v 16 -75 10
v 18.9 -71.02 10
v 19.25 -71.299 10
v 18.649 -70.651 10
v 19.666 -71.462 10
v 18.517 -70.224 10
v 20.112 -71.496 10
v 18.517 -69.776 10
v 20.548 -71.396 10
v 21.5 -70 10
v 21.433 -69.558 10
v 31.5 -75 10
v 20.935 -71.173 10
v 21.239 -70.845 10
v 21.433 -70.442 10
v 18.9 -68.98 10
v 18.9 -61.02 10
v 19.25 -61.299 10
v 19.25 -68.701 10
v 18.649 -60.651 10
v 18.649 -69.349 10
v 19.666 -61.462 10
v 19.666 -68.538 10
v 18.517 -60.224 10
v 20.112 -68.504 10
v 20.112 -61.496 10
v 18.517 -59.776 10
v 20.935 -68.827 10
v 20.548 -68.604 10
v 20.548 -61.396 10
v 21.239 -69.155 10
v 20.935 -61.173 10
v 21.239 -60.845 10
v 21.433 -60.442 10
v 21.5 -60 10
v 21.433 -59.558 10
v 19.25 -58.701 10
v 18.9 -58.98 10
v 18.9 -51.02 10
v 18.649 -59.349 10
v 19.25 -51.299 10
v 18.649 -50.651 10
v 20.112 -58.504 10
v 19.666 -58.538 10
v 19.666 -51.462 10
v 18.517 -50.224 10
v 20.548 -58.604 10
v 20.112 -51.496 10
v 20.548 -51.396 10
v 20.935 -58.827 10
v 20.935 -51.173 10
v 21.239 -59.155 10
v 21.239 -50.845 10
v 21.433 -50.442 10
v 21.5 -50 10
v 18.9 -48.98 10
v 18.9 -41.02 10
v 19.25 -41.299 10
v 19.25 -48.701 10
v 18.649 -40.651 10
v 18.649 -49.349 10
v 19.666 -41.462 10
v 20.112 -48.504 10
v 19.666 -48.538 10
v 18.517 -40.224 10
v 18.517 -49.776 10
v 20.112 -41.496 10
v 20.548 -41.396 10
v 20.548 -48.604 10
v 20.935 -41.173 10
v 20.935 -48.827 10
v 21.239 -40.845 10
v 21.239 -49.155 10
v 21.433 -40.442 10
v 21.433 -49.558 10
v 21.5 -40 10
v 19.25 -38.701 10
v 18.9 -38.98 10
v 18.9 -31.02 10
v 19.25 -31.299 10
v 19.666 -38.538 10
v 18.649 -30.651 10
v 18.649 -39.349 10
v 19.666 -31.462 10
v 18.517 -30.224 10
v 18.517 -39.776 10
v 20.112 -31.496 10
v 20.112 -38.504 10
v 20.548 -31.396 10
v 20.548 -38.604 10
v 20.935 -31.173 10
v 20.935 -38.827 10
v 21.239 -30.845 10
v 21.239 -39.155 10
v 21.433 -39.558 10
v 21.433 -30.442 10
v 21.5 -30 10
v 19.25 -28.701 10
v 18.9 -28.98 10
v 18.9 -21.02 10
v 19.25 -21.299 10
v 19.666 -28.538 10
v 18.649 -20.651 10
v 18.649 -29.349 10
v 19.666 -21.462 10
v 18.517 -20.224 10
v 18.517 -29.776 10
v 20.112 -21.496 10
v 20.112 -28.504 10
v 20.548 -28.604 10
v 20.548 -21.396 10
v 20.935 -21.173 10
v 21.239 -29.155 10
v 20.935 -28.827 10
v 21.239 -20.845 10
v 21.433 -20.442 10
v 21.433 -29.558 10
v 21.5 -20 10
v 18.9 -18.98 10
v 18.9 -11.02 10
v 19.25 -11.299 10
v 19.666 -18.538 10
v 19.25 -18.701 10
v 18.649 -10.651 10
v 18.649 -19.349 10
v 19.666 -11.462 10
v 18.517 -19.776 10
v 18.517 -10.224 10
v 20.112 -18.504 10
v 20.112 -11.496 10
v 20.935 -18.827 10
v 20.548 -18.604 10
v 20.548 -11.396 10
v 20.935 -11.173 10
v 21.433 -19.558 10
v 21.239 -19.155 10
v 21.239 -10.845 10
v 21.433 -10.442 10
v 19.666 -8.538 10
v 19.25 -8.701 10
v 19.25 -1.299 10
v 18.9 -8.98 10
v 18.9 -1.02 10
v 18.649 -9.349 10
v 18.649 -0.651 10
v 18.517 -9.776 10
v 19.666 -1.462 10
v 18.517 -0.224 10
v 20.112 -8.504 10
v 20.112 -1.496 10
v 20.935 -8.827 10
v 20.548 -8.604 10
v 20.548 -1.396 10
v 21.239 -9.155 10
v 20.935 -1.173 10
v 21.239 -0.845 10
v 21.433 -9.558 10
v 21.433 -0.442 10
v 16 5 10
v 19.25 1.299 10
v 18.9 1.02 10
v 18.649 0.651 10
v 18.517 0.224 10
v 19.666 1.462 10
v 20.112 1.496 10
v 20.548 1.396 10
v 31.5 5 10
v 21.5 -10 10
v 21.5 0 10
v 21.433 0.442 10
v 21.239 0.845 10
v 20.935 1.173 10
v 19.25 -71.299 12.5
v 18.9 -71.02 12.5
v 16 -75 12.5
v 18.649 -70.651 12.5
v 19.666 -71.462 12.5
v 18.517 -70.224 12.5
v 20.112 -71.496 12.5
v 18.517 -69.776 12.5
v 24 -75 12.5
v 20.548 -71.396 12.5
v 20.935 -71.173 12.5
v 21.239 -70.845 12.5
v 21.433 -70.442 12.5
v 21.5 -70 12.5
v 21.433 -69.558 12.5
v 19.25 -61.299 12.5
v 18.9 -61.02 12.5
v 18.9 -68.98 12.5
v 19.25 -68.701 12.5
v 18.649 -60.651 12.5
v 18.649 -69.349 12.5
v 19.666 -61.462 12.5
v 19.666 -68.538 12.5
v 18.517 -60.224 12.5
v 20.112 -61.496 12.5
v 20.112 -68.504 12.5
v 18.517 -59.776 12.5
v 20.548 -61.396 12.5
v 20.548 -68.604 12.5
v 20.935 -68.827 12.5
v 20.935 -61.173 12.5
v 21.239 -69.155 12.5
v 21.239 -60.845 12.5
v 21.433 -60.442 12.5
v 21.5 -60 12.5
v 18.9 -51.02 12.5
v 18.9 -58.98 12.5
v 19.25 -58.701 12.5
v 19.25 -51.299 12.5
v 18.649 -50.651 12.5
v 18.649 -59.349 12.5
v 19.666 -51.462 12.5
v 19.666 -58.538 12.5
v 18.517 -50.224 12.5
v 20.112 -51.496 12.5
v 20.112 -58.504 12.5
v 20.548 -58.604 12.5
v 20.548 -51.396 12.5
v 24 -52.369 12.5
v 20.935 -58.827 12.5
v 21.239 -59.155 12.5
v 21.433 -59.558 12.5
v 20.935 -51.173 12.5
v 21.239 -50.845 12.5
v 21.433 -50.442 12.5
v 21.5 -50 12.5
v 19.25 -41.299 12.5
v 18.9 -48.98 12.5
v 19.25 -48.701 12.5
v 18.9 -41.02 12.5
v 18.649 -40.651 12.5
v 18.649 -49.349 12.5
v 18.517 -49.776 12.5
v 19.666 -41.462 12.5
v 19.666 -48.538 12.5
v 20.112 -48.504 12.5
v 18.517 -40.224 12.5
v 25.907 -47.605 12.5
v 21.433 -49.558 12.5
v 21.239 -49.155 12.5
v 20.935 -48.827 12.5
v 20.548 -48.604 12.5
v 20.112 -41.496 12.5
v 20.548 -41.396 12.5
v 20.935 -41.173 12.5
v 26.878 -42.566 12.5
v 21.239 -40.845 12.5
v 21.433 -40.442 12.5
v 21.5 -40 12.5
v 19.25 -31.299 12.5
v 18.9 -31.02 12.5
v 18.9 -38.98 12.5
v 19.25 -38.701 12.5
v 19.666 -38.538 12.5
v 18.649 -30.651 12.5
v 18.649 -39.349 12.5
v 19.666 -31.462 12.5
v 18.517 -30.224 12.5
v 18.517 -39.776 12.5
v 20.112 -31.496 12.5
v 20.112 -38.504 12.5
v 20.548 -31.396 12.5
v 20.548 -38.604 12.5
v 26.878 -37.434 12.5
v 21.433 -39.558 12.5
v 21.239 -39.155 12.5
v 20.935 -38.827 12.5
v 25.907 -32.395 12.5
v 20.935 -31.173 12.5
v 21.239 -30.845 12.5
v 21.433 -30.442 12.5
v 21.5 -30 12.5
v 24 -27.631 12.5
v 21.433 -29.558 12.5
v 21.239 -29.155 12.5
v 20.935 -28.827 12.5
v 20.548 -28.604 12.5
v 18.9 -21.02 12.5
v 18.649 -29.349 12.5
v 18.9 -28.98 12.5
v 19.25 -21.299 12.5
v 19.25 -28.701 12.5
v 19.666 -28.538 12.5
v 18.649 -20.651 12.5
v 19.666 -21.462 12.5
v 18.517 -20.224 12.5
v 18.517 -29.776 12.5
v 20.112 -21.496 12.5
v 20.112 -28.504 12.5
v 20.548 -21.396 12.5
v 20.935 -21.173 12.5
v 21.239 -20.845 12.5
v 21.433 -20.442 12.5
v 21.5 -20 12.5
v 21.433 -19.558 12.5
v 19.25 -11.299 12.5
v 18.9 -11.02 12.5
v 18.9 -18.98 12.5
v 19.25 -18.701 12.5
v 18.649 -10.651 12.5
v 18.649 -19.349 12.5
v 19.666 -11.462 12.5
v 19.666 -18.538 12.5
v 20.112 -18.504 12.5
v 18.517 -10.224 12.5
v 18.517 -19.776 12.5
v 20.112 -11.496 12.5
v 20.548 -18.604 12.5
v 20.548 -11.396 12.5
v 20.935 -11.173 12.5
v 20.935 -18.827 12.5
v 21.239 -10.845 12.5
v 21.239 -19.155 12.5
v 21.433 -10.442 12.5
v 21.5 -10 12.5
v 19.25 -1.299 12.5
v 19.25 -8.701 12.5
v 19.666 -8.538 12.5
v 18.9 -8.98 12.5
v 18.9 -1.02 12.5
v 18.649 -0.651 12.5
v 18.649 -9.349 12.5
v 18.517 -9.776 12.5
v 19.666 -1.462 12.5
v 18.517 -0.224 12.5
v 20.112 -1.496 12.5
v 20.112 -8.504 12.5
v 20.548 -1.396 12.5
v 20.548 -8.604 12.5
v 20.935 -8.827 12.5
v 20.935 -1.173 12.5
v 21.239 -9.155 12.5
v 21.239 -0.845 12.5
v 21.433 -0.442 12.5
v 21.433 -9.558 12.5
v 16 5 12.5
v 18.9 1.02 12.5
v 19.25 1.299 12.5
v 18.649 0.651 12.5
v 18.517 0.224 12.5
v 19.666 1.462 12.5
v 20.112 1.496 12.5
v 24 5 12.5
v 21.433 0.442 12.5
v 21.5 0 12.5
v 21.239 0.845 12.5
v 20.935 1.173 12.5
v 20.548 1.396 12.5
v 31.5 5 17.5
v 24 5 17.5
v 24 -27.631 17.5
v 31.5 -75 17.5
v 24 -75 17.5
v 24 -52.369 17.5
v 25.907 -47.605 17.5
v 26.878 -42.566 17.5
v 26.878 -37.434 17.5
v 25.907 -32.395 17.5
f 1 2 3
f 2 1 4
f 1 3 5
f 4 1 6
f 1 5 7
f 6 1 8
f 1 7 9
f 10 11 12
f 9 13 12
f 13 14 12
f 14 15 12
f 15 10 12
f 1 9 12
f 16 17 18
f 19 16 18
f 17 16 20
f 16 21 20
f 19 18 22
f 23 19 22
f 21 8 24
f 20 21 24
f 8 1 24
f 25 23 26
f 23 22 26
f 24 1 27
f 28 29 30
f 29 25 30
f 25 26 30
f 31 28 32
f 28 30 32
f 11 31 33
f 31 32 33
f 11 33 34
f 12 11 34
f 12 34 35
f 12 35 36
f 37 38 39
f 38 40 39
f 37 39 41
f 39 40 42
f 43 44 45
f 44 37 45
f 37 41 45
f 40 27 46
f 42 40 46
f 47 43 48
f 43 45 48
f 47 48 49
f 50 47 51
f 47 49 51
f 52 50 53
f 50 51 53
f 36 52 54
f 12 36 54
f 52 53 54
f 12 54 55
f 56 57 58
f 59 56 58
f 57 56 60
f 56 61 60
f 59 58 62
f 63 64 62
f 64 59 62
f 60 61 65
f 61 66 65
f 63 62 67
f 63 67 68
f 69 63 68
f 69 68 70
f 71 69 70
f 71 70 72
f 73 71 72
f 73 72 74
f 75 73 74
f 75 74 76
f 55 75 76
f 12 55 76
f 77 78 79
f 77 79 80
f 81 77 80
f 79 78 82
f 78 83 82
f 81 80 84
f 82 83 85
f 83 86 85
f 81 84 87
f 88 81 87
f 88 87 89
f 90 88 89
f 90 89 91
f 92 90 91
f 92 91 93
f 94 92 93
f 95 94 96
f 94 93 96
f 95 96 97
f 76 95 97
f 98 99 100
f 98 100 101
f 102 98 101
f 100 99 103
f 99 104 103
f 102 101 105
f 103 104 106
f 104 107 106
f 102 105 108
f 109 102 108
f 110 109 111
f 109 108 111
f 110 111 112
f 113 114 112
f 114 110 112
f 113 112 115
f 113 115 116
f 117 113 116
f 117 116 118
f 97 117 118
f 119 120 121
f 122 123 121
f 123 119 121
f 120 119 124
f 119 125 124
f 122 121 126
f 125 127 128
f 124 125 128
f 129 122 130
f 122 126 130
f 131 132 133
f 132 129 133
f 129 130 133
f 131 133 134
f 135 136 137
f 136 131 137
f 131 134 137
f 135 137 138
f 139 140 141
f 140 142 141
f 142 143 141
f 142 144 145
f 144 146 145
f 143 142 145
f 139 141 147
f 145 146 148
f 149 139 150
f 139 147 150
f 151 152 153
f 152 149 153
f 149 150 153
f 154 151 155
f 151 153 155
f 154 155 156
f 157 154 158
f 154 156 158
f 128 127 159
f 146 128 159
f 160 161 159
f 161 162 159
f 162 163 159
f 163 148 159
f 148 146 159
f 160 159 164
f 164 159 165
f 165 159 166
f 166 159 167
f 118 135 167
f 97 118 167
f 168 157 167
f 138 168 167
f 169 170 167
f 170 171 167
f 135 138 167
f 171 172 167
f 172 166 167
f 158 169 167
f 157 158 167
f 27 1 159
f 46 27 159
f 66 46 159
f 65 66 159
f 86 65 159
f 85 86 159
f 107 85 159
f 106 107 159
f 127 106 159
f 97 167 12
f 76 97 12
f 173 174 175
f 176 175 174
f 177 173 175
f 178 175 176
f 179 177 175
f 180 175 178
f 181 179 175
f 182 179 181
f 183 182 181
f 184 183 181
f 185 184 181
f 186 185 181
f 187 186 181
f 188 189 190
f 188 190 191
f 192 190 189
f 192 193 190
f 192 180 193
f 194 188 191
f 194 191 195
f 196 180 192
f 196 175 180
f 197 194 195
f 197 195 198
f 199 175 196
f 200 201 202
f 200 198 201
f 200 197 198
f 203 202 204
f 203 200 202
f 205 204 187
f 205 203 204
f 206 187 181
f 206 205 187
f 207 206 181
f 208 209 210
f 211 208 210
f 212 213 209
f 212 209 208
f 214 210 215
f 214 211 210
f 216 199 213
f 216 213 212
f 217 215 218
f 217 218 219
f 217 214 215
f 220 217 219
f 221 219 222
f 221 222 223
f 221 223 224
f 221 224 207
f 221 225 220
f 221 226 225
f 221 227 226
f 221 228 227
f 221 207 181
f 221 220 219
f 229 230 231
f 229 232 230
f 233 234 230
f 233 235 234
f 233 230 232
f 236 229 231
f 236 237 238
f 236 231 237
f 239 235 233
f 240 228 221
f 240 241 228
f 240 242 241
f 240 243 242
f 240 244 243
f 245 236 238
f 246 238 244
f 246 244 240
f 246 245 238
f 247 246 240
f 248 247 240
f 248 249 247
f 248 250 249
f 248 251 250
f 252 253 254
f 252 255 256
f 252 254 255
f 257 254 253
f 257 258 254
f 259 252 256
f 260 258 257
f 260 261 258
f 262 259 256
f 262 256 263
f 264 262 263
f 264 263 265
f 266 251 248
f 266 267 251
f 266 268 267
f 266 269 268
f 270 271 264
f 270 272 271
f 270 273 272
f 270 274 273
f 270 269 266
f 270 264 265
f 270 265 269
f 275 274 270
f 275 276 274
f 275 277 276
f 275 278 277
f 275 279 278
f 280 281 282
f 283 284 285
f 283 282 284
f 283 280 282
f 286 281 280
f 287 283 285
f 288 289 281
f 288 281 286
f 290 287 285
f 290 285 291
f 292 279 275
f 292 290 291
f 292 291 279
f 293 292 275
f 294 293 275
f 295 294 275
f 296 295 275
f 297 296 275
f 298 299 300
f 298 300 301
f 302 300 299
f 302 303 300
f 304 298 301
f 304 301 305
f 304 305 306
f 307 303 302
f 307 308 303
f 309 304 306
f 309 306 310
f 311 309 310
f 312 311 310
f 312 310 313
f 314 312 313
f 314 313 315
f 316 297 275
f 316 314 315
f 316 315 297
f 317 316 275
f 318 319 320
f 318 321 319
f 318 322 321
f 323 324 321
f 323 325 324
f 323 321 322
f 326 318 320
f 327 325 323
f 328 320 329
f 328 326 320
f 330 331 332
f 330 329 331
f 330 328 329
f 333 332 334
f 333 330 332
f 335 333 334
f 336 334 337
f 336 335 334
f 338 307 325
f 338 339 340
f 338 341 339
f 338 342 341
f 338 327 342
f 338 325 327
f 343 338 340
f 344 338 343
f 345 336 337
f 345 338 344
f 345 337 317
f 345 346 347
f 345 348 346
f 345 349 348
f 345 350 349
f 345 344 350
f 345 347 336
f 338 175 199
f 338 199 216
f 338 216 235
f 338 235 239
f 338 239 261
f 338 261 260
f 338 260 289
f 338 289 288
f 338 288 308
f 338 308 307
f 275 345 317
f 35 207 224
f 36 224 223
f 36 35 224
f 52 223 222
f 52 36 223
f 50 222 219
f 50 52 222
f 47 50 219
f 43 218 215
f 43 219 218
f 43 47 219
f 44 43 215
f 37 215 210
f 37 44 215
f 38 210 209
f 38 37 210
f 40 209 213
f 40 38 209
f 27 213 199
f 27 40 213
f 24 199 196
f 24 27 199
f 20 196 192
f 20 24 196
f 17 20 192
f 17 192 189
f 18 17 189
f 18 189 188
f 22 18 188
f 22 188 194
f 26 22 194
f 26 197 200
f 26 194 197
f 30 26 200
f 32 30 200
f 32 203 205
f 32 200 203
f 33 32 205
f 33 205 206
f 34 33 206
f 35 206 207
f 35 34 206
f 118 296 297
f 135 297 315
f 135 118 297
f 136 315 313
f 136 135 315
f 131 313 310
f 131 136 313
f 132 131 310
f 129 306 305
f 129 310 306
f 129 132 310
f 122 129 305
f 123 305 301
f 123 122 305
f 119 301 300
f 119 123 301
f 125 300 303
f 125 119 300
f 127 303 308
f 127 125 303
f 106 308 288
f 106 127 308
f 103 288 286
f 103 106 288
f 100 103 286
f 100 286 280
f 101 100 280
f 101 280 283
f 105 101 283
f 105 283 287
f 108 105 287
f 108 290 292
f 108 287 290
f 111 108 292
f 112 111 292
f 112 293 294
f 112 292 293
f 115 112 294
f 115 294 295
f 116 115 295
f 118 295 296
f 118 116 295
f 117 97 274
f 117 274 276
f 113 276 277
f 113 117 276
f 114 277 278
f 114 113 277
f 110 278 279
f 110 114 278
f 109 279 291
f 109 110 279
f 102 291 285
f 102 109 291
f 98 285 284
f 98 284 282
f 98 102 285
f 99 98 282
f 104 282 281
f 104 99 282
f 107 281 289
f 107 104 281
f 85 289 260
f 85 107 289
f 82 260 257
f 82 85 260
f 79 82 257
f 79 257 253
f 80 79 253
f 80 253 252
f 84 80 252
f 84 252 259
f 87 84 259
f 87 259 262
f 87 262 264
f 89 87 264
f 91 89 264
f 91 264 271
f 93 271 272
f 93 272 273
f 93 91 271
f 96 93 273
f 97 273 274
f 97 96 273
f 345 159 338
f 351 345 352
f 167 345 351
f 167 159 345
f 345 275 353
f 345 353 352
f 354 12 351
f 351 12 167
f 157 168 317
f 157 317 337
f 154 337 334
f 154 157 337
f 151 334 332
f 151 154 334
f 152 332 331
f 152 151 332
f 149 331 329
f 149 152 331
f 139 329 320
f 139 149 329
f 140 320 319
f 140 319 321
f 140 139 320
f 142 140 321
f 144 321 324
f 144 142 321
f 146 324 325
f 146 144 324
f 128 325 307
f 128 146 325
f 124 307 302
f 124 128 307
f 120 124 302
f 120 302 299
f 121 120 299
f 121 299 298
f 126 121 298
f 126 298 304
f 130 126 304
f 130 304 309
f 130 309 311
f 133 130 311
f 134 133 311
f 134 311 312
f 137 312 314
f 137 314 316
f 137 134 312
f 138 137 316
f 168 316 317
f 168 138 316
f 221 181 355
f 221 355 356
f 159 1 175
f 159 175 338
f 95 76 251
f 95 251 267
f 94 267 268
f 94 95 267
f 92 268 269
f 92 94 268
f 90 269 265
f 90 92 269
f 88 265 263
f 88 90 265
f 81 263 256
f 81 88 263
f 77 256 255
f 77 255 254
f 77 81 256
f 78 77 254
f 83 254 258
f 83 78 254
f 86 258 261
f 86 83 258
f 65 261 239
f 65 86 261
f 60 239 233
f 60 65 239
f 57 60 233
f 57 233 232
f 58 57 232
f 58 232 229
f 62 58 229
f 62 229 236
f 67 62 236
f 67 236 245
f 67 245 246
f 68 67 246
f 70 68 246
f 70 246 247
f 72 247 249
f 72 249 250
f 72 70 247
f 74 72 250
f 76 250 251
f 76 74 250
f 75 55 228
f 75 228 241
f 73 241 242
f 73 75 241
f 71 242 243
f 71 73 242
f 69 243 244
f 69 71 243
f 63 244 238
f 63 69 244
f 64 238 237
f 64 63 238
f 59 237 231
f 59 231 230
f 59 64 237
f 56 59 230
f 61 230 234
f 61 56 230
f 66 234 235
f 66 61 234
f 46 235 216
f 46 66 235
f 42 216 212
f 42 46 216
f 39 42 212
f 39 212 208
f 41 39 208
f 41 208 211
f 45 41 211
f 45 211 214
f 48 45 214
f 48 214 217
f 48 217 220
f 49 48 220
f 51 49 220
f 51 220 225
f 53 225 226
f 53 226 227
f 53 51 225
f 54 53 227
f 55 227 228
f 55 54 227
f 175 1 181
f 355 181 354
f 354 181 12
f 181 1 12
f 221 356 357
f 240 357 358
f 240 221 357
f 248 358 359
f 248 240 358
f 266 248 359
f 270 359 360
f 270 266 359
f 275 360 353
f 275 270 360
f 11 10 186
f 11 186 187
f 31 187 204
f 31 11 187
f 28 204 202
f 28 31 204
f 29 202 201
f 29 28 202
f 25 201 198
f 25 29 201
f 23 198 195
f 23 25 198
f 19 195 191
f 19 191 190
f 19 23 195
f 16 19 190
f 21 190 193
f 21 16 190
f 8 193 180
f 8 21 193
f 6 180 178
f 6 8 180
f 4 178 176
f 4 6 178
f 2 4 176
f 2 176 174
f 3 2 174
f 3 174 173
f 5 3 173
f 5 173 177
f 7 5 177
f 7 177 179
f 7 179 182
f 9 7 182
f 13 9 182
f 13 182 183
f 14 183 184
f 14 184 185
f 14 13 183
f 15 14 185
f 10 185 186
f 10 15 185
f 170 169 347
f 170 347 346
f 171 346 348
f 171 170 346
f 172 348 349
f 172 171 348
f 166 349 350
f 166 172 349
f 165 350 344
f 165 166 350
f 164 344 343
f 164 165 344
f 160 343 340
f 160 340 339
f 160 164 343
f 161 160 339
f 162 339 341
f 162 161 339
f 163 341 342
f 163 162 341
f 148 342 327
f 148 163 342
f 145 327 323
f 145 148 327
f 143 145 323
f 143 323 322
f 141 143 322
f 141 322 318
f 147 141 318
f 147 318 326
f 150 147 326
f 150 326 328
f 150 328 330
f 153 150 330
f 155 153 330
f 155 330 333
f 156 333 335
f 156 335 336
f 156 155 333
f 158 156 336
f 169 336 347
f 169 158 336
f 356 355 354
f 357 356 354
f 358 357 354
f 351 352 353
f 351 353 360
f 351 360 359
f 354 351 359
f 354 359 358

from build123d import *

# Parameters (mm, degrees)
SKETCH013_R  = 27
PAD008_DEPTH = 10
SKETCH011_W  = 8
SKETCH011_H  = 80
SKETCH011_R  = 1.5
PAD007_DEPTH = 2.5
SKETCH010_W  = 7.5
SKETCH010_H  = 80
PAD006_DEPTH = 7.5


with BuildPart() as pad008:
    # Sketch013 → Pad008 (new body)
    with BuildSketch(Plane(origin=(0, -40, 12.5), x_dir=(1, 0, 0), z_dir=(0, 0, 1))):
        Circle(SKETCH013_R)
    extrude(amount=PAD008_DEPTH)


with BuildPart() as pad007:
    # Sketch011 → Pad007 (new body)
    with BuildSketch(Plane.XY.offset(10)):
        with Locations((-4, -40)):
            Rectangle(SKETCH011_W, SKETCH011_H)
        with Locations((-4, -45)):
            Circle(SKETCH011_R, mode=Mode.SUBTRACT)
        with Locations((-4, -65)):
            Circle(SKETCH011_R, mode=Mode.SUBTRACT)
        with Locations((-4, -55)):
            Circle(SKETCH011_R, mode=Mode.SUBTRACT)
        with Locations((-4, -75)):
            Circle(SKETCH011_R, mode=Mode.SUBTRACT)
        with Locations((-4, -35)):
            Circle(SKETCH011_R, mode=Mode.SUBTRACT)
        with Locations((-4, -25)):
            Circle(SKETCH011_R, mode=Mode.SUBTRACT)
        with Locations((-4, -15)):
            Circle(SKETCH011_R, mode=Mode.SUBTRACT)
        with Locations((-4, -5)):
            Circle(SKETCH011_R, mode=Mode.SUBTRACT)
    extrude(amount=PAD007_DEPTH)


with BuildPart() as cut002:
    # Sketch010 → Pad006 (new body)
    with BuildSketch(Plane.XY.offset(10)):
        with Locations((3.75, -40)):
            Rectangle(SKETCH010_W, SKETCH010_H)
    extrude(amount=PAD006_DEPTH)

    # Fusion003: union Pad007
    add(pad007.part)


with BuildPart() as cut002_1:
    # Fusion003 placement: moved
    add(cut002.part.moved(Location((24, 5, 0))))

    # Cut002: cut Pad008
    add(pad008.part, mode=Mode.SUBTRACT)


solid = cut002_1.part
